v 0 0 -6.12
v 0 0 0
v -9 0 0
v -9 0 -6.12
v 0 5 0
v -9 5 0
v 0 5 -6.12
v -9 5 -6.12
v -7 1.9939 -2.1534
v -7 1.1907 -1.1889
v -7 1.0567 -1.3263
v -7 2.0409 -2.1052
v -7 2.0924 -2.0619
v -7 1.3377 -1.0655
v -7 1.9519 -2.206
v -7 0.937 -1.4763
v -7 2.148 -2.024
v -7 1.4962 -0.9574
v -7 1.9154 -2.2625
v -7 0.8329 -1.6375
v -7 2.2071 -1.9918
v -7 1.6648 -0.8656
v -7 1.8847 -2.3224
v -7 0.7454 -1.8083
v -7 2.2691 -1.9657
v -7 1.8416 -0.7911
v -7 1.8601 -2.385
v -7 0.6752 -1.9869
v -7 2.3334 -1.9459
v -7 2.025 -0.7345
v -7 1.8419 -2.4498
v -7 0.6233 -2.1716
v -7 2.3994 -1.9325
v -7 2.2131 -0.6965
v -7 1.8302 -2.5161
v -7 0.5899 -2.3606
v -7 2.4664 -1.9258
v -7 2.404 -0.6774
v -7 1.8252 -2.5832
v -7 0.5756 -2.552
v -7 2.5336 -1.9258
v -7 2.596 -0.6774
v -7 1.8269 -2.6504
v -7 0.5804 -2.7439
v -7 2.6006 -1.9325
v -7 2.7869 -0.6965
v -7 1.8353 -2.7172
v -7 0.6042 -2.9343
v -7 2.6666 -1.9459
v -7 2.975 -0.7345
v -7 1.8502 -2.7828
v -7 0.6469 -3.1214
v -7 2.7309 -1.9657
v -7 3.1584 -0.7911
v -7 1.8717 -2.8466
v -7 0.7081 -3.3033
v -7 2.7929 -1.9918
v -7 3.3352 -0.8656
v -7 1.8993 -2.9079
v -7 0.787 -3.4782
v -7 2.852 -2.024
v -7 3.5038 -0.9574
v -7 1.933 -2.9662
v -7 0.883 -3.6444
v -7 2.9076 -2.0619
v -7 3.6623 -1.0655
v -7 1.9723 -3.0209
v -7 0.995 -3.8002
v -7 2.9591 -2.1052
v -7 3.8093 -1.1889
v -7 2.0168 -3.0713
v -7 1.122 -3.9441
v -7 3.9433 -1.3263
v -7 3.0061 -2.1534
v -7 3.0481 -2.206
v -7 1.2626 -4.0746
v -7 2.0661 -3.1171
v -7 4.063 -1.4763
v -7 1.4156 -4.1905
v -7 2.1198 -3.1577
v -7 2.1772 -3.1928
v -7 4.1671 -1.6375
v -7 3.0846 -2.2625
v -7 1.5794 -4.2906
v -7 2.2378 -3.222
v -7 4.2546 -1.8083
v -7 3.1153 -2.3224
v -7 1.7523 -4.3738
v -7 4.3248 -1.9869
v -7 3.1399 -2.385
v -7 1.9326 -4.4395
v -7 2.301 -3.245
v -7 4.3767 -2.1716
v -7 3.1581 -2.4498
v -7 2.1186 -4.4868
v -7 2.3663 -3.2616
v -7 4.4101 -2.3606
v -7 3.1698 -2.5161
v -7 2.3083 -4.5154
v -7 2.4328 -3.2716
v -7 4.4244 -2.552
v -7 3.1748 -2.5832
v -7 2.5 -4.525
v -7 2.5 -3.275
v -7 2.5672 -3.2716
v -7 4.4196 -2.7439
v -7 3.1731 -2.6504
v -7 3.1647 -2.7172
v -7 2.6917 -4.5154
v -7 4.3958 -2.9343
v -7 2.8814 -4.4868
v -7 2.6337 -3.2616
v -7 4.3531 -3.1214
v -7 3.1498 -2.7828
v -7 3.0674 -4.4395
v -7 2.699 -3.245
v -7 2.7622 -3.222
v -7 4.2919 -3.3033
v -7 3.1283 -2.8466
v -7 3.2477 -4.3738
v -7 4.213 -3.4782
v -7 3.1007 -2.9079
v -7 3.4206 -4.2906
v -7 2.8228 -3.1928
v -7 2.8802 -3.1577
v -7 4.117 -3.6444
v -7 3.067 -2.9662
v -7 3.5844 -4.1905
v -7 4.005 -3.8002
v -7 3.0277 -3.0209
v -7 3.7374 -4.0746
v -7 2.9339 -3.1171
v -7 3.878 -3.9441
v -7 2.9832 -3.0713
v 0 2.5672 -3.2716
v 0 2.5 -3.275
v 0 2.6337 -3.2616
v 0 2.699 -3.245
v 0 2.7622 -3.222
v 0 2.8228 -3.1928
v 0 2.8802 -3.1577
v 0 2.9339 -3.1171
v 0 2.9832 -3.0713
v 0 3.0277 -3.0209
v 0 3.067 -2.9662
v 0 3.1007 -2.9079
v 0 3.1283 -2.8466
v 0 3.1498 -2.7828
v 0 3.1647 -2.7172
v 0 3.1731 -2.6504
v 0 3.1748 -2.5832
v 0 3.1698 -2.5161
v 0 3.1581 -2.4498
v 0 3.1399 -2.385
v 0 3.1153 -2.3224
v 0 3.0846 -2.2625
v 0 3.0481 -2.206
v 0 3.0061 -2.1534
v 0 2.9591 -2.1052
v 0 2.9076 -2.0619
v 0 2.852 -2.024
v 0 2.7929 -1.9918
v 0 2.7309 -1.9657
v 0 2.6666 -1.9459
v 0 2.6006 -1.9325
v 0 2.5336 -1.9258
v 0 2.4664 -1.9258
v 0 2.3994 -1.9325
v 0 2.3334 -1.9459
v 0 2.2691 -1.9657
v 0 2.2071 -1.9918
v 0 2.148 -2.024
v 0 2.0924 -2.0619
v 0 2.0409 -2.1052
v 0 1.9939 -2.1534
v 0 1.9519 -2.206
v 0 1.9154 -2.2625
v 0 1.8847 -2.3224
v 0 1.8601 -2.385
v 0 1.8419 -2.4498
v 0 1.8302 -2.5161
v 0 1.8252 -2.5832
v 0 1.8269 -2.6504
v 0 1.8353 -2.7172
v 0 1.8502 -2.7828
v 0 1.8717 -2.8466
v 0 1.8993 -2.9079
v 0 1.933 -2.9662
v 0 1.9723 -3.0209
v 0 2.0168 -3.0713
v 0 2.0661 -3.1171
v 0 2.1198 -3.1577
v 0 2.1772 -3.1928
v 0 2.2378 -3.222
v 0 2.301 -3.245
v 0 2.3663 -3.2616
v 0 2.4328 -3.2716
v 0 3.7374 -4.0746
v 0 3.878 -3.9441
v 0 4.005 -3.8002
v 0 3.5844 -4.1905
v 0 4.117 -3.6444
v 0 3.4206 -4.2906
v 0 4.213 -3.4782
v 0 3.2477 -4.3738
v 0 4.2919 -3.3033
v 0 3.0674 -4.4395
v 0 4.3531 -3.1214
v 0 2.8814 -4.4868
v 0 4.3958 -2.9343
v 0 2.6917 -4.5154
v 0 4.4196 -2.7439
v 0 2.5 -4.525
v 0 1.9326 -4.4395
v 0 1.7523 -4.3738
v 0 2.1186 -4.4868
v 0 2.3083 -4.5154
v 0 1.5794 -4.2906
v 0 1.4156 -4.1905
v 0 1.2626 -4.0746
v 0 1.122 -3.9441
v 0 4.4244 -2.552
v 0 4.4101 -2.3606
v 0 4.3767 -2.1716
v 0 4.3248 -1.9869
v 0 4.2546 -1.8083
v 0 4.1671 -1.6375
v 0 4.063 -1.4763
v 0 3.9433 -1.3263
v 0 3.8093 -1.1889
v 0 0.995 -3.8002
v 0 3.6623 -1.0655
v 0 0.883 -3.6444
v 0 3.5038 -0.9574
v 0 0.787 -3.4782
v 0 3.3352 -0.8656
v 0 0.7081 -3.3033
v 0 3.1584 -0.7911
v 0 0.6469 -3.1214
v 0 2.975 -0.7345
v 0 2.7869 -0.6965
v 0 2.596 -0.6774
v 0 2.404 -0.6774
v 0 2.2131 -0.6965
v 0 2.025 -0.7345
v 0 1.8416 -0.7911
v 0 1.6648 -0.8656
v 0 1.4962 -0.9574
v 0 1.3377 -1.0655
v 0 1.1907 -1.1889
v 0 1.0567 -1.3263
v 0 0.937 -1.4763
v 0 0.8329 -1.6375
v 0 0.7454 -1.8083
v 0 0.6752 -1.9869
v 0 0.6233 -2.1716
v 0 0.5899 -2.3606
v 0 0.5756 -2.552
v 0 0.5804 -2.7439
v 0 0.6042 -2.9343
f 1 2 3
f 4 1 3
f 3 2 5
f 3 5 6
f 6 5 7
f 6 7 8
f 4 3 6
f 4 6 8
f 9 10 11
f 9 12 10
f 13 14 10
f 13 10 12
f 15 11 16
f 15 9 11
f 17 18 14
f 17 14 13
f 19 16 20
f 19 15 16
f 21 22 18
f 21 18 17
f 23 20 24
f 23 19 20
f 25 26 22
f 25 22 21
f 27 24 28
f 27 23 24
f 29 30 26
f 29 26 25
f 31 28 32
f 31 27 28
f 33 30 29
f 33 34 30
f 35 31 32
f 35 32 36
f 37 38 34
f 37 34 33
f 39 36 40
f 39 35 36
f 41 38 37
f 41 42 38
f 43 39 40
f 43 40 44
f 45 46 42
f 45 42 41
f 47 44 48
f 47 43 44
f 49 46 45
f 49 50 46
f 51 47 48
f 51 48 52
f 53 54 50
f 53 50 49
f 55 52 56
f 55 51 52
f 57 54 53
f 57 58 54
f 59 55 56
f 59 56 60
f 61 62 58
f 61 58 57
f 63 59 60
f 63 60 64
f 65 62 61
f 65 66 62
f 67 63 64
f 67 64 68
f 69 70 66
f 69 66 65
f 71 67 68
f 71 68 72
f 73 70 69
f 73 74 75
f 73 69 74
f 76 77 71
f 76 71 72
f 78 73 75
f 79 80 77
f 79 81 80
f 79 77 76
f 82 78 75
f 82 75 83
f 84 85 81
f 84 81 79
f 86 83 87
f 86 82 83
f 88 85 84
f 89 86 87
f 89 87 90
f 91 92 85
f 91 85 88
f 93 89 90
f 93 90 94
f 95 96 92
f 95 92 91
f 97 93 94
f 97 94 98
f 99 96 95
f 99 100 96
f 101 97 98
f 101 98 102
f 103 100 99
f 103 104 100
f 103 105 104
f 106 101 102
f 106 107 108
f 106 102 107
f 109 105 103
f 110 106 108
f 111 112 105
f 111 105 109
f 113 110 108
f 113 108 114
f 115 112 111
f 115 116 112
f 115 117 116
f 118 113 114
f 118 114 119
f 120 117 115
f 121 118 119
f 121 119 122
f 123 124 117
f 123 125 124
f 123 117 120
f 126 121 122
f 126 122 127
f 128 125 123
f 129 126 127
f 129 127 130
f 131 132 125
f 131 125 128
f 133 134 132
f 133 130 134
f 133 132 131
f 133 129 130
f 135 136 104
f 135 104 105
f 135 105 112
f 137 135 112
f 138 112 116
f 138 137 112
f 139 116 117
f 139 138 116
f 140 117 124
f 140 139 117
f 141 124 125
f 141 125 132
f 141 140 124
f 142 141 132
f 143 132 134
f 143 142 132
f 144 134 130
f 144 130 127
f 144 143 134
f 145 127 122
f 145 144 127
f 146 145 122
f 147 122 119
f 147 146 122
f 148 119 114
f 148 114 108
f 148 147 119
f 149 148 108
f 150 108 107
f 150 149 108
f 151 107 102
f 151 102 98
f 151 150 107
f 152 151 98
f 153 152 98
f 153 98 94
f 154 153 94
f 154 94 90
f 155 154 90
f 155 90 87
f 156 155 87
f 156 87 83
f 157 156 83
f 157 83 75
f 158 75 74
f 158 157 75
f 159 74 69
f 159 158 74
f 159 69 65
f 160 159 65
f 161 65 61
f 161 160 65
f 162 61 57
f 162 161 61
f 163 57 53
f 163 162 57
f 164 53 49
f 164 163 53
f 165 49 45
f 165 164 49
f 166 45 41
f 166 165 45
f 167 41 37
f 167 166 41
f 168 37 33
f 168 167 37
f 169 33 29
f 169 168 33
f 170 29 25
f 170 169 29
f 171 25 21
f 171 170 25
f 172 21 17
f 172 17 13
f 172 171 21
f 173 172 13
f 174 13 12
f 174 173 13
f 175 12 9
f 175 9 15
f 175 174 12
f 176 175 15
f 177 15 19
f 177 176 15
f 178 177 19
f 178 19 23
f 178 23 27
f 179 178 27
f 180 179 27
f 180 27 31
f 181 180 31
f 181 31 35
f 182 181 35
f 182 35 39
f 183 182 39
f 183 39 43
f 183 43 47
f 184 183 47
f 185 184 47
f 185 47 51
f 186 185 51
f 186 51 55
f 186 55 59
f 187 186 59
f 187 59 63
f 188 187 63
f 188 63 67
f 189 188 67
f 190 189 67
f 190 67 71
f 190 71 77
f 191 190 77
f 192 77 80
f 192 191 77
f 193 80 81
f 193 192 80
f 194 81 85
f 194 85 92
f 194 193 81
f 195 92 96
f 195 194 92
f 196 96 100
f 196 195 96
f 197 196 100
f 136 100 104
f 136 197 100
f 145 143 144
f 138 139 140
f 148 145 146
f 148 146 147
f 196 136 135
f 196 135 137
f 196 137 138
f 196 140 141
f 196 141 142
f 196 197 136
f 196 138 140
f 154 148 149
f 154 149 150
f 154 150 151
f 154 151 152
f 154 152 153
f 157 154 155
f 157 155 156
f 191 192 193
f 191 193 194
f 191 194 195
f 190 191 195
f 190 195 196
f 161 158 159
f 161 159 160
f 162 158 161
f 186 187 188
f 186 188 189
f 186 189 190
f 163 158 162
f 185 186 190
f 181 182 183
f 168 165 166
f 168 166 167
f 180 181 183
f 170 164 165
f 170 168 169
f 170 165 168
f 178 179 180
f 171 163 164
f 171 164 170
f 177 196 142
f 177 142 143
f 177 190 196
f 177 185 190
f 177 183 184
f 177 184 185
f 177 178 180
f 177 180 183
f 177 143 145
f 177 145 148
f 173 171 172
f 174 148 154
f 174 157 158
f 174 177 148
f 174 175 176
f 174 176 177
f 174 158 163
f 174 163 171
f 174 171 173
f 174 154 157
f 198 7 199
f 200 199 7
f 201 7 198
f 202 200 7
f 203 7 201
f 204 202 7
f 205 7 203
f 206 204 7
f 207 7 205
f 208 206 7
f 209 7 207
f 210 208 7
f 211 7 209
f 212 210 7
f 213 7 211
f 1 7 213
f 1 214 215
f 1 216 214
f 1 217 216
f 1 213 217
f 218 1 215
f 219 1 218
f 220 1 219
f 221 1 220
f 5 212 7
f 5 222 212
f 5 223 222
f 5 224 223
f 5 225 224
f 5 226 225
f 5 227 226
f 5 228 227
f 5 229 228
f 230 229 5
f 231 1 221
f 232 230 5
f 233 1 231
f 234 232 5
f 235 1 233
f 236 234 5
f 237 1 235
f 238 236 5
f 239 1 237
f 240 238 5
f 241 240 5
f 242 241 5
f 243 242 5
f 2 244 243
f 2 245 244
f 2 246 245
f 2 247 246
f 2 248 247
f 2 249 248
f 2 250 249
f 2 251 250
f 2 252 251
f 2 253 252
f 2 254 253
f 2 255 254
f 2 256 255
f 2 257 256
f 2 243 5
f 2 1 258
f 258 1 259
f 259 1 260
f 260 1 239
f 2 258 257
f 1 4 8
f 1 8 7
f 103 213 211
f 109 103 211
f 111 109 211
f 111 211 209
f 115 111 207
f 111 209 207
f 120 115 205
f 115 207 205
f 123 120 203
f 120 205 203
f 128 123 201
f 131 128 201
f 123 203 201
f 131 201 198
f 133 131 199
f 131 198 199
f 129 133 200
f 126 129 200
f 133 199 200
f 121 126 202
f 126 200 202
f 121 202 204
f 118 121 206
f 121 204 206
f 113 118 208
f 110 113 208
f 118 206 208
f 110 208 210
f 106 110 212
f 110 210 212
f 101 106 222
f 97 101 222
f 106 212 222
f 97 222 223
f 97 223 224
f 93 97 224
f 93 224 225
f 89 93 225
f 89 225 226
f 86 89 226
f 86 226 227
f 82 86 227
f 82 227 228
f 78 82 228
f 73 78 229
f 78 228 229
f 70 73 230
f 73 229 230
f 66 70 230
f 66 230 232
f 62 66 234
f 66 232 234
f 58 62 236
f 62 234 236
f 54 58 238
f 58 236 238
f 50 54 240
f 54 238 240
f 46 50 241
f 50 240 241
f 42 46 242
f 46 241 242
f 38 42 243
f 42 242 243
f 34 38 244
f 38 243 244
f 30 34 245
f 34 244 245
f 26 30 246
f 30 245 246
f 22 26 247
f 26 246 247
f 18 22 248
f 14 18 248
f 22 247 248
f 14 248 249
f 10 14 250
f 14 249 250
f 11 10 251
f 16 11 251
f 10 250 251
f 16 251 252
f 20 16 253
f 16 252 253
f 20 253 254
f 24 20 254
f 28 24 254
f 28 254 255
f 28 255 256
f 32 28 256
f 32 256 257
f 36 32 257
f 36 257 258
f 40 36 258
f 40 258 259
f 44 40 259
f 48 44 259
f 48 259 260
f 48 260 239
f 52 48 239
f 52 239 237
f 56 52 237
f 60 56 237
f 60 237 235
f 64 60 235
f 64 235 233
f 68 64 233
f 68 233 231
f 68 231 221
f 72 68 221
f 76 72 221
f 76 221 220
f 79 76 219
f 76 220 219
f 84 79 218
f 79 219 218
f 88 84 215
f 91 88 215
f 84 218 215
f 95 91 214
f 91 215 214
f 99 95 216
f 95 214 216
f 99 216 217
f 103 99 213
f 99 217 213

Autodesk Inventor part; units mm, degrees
ref_plane "YZ Plane" through (0, 0, 0) normal (1, 0, 0) x (0, 1, 0)
ref_plane "XZ Plane" through (0, 0, 0) normal (0, 1, 0) x (-1, 0, 0)
ref_plane "XY Plane" through (0, 0, 0) normal (0, 0, 1) x (1, 0, 0)
sketch "Sketch1" plane through (0, 0, 0) normal (0, 1, 0) x (-1, 0, 0)
  line L0 (0, 0) -> (9, 0)
  line L1 (9, 0) -> (9, -6.12)
  line L2 (9, -6.12) -> (0, -6.12)
  line L3 (0, -6.12) -> (0, 0)
  dimension "d0" = 6.12
  dimension "d1" = 9
extrude "Extrusion1" add sketch "Sketch1" along normal blind 5
sketch "Sketch2" plane through (0, 0, 0) normal (1, 0, 0) x (0, 0, -1)
  circle A0 centre (2.6, 2.5) radius 1.925
  circle A1 centre (2.6, 2.5) radius 0.675
  line L0 (6.12, 0) -> (0, 0) projected
  line L1 (0, 5) -> (6.12, 5) projected
  line L2 (0, 0) -> (0, 5) projected
  dimension "d4" = 3.85
  dimension "d5" = 1.35
  dimension "d6" = 5
  dimension "d7" = 2.5
  dimension "d8" = 2.6
extrude "Extrusion2" cut sketch "Sketch2" against normal blind 7
equation "\"d7\" = 0.5 * d6"
properties part number "Barrel Jack small"
